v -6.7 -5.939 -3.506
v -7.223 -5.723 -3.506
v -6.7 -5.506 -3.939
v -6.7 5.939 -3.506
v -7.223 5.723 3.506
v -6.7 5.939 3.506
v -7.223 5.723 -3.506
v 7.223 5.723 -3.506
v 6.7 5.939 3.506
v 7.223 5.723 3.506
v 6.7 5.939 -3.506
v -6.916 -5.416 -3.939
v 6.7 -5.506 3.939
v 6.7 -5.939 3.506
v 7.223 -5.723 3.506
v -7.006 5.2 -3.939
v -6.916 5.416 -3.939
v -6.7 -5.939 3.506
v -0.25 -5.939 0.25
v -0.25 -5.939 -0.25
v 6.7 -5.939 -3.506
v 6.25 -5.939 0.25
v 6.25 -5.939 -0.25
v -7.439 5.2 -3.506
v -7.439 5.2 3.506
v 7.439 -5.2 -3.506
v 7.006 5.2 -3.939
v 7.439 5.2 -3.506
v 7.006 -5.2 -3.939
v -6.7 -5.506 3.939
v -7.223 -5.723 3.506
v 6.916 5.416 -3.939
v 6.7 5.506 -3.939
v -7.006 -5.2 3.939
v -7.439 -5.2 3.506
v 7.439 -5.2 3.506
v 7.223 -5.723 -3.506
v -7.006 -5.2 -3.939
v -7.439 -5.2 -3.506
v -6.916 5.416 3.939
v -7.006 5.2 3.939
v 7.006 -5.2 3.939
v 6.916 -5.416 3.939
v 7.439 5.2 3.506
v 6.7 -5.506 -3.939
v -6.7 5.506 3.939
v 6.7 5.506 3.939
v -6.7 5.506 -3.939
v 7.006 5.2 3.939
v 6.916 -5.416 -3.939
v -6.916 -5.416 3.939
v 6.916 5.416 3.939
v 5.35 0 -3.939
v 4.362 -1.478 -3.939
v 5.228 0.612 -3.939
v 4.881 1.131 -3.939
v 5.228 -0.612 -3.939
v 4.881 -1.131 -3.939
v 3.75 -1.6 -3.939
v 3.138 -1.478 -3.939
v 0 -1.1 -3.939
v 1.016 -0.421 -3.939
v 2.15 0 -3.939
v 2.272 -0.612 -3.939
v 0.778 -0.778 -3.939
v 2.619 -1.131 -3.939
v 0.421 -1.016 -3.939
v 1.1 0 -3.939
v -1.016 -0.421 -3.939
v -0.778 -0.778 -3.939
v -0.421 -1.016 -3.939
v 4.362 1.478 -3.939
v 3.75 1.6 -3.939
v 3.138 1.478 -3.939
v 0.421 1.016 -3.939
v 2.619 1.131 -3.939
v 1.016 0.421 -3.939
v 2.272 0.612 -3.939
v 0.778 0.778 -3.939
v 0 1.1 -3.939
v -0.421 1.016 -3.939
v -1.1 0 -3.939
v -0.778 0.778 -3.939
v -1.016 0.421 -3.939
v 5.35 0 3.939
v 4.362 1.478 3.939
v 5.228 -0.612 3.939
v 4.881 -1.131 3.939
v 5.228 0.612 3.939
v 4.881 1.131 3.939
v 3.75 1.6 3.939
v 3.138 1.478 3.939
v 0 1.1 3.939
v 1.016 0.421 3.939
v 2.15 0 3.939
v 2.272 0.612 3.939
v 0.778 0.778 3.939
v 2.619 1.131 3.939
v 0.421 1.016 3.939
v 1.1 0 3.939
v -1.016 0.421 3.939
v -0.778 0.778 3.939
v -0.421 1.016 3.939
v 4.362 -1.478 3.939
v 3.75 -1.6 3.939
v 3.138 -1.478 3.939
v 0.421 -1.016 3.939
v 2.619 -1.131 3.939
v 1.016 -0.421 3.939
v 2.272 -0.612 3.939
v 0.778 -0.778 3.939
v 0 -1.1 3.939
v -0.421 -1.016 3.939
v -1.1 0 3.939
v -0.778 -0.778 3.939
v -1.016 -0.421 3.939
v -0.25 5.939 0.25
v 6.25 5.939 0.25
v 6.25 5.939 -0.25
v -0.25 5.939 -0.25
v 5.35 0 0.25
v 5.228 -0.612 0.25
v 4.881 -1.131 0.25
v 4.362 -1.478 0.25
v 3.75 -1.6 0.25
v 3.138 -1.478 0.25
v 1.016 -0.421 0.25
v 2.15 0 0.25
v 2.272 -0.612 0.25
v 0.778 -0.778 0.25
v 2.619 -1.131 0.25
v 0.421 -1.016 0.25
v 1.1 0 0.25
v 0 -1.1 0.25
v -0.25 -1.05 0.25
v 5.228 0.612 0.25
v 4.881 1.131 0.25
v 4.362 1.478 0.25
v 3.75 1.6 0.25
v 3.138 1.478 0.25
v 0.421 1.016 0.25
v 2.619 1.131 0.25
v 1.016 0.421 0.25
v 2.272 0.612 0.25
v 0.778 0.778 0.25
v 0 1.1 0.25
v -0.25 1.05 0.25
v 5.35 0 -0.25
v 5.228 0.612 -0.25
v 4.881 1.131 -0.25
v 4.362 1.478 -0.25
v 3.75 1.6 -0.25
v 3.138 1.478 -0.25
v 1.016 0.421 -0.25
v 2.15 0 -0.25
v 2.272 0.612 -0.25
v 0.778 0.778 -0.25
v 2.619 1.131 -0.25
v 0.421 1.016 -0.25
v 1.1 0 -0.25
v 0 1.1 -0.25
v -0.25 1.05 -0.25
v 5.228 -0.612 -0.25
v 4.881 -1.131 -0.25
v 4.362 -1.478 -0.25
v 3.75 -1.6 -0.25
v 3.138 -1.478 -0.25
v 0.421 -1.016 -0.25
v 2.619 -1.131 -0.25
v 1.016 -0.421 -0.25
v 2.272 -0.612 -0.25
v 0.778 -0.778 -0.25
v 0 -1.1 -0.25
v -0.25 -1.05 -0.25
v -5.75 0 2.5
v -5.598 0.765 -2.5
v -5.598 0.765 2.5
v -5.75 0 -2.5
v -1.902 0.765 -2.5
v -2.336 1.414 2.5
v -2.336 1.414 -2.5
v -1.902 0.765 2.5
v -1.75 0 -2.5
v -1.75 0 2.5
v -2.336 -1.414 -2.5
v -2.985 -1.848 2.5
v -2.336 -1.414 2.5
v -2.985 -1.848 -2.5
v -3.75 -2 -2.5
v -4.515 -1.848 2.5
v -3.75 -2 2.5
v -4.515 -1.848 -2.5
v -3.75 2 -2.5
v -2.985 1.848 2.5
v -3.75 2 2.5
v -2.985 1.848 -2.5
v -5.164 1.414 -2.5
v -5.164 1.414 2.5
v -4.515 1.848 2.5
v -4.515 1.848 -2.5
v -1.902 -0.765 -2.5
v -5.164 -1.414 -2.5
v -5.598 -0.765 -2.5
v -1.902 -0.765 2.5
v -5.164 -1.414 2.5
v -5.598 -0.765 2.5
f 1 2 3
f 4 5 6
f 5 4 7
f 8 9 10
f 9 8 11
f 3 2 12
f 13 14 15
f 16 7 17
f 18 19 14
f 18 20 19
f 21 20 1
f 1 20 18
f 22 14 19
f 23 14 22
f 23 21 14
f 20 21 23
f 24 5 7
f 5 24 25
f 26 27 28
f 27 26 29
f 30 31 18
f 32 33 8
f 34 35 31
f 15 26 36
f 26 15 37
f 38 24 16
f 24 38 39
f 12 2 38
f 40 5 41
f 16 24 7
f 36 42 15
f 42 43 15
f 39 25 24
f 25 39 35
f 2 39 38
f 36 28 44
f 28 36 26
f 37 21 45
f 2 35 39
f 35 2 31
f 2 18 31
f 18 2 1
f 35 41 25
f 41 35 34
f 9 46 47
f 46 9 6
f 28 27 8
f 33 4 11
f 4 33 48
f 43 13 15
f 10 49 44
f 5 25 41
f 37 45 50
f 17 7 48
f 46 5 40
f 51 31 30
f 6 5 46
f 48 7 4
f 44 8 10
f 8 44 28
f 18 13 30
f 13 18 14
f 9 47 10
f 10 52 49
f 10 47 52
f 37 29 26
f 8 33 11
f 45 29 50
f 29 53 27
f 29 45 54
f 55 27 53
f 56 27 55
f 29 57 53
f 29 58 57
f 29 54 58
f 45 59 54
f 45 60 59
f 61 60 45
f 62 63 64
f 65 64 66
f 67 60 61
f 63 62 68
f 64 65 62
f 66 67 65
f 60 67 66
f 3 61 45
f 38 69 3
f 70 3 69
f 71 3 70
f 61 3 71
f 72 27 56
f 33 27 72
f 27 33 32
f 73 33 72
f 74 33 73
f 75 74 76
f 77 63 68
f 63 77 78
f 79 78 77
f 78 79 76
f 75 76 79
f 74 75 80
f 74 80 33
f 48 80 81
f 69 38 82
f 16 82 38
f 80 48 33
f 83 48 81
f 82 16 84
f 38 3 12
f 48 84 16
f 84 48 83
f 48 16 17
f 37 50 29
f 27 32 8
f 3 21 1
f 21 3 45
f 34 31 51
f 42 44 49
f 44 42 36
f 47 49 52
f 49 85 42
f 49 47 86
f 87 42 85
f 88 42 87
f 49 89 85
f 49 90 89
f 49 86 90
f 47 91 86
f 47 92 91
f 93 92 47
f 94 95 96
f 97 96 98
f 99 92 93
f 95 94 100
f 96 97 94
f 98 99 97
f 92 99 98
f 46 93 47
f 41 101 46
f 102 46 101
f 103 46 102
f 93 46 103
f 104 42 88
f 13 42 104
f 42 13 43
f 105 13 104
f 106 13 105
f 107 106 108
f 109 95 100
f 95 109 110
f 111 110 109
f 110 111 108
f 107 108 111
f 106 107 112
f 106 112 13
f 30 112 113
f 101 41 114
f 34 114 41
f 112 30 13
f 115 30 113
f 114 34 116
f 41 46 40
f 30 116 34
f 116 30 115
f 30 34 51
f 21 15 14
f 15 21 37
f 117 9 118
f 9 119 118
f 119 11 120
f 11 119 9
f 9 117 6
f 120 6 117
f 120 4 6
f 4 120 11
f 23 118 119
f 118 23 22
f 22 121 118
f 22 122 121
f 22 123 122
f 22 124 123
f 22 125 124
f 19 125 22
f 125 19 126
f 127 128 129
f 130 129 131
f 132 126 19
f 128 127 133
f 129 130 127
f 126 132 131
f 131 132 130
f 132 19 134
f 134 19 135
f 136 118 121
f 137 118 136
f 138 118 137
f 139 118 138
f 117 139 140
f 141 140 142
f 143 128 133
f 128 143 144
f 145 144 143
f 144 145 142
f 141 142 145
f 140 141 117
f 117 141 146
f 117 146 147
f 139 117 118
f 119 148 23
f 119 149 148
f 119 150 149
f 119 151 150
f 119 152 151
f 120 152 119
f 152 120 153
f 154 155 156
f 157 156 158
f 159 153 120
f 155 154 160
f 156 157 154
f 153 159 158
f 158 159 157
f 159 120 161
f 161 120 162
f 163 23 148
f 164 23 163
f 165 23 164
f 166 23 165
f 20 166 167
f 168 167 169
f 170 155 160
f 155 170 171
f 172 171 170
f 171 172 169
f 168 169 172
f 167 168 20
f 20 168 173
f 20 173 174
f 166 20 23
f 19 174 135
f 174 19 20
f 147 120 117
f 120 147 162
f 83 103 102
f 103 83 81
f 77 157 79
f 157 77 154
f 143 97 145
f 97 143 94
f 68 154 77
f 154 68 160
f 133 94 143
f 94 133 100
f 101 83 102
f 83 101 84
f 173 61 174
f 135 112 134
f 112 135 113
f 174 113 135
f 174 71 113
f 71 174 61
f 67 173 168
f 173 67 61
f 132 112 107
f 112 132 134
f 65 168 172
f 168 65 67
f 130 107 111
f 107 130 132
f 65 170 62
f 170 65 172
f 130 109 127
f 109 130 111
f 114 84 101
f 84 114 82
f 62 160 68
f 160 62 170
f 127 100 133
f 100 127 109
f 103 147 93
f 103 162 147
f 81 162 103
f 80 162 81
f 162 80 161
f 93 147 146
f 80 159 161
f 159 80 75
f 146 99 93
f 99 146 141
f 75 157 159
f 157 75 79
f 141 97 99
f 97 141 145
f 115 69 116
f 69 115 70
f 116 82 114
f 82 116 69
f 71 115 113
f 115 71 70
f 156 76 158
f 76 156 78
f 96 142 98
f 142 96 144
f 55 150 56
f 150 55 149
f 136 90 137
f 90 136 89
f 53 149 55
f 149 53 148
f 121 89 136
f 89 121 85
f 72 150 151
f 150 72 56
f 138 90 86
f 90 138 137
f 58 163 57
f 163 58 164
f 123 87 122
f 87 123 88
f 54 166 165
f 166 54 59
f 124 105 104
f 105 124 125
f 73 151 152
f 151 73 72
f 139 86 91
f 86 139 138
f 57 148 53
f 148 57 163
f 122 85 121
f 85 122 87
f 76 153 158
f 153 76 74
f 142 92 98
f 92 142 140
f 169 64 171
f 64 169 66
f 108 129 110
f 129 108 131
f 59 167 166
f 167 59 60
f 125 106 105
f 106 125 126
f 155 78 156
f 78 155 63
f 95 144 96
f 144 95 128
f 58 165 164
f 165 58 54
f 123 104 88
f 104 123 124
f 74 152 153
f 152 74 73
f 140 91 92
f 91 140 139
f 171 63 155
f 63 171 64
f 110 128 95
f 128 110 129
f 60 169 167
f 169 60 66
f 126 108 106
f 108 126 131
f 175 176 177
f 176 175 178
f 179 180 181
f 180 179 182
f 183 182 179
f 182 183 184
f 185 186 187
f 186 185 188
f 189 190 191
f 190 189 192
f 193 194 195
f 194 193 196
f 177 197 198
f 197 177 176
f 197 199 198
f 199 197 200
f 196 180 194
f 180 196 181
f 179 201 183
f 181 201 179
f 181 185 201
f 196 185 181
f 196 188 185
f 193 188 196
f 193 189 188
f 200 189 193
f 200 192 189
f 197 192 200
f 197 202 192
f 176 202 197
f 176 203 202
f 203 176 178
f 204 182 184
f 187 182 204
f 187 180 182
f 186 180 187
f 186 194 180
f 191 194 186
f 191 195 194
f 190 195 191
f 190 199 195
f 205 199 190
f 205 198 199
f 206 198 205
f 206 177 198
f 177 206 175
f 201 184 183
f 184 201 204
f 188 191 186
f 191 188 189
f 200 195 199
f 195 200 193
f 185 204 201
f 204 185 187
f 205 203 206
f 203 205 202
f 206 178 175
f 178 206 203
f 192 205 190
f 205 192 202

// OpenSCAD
// ============================================================
//  tpu_joint_j4.scad — Passiver TPU-Federblock J4
//  Material: TPU 85A (WEICHER als J3!), 20% Gyroid Infill
//  Funktion: Elastische Verbindung Segment 3 → Schwanzflosse
//  Resonanz: f_res ≈ 0.8 Hz — maximales Nachschwingen!
// ============================================================

// Parameter (kompakter als J3)
breite     = 15;   // mm (X)
tiefe      = 12;   // mm (Y)
hoehe      = 8;    // mm (Z)
wand       = 0.8;  // mm Wandstärke (2 Perimeter à 0.4mm — sehr weich!)
bolzen_r   = 1.1;  // mm Radius M2-Bohrung
stahl_h    = 0.5;  // mm Federstahl-Kanal Höhe
stahl_b    = 6.5;  // mm Federstahl-Kanal Breite (kürzer als J3)
fase       = 0.8;  // mm Fase
anstell    = 3;    // mm Federstahl leicht nach hinten versetzt
               //    → gibt Schwanzflosse natürlichen Anstellwinkel

module tpu_federblock_j4(b, t, h, bolzen_r, stahl_h, stahl_b, fase, anstell) {
    difference() {
        // Grundkörper mit Fasen
        hull() {
            for (x = [-b/2+fase, b/2-fase])
            for (y = [-t/2+fase, t/2-fase])
            for (z = [-h/2+fase, h/2-fase])
                translate([x, y, z]) sphere(r=fase, $fn=8);
        }

        // Federstahl-Kanal (leicht nach hinten versetzt → Anstellwinkel)
        translate([anstell, 0, 0])
            cube([stahl_b, t+1, stahl_h], center=true);

        // M2-Montage-Bohrung (1× zentral — kleinerer Block)
        translate([0, 0, 0])
            cylinder(h=h+1, r=bolzen_r, $fn=16, center=true);

        // Schwanzflosse-Verbindungs-Nut (hinten, für CFK-Stab Ø3mm)
        translate([b/4, 0, 0])
            cylinder(h=h+1, r=1.6, $fn=16, center=true);

        // Segment-Zapfen-Aufnahme (vorne)
        translate([-b/4, 0, 0])
            cylinder(h=5, r=2.0, $fn=16, center=true);
    }
}

tpu_federblock_j4(breite, tiefe, hoehe, bolzen_r, stahl_h, stahl_b, fase, anstell);

echo(str("J4 TPU-Federblock: ", breite, "×", tiefe, "×", hoehe, "mm"));
echo(str("Material: TPU 85A | Infill: 20% Gyroid"));
echo(str("Federstahl-Kanal: ", stahl_b, "mm, versetzt ", anstell, "mm → Anstellwinkel"));
echo(str("Resonanz: ~0.8 Hz | Erwartete Amplitude: ±12-18°"));
